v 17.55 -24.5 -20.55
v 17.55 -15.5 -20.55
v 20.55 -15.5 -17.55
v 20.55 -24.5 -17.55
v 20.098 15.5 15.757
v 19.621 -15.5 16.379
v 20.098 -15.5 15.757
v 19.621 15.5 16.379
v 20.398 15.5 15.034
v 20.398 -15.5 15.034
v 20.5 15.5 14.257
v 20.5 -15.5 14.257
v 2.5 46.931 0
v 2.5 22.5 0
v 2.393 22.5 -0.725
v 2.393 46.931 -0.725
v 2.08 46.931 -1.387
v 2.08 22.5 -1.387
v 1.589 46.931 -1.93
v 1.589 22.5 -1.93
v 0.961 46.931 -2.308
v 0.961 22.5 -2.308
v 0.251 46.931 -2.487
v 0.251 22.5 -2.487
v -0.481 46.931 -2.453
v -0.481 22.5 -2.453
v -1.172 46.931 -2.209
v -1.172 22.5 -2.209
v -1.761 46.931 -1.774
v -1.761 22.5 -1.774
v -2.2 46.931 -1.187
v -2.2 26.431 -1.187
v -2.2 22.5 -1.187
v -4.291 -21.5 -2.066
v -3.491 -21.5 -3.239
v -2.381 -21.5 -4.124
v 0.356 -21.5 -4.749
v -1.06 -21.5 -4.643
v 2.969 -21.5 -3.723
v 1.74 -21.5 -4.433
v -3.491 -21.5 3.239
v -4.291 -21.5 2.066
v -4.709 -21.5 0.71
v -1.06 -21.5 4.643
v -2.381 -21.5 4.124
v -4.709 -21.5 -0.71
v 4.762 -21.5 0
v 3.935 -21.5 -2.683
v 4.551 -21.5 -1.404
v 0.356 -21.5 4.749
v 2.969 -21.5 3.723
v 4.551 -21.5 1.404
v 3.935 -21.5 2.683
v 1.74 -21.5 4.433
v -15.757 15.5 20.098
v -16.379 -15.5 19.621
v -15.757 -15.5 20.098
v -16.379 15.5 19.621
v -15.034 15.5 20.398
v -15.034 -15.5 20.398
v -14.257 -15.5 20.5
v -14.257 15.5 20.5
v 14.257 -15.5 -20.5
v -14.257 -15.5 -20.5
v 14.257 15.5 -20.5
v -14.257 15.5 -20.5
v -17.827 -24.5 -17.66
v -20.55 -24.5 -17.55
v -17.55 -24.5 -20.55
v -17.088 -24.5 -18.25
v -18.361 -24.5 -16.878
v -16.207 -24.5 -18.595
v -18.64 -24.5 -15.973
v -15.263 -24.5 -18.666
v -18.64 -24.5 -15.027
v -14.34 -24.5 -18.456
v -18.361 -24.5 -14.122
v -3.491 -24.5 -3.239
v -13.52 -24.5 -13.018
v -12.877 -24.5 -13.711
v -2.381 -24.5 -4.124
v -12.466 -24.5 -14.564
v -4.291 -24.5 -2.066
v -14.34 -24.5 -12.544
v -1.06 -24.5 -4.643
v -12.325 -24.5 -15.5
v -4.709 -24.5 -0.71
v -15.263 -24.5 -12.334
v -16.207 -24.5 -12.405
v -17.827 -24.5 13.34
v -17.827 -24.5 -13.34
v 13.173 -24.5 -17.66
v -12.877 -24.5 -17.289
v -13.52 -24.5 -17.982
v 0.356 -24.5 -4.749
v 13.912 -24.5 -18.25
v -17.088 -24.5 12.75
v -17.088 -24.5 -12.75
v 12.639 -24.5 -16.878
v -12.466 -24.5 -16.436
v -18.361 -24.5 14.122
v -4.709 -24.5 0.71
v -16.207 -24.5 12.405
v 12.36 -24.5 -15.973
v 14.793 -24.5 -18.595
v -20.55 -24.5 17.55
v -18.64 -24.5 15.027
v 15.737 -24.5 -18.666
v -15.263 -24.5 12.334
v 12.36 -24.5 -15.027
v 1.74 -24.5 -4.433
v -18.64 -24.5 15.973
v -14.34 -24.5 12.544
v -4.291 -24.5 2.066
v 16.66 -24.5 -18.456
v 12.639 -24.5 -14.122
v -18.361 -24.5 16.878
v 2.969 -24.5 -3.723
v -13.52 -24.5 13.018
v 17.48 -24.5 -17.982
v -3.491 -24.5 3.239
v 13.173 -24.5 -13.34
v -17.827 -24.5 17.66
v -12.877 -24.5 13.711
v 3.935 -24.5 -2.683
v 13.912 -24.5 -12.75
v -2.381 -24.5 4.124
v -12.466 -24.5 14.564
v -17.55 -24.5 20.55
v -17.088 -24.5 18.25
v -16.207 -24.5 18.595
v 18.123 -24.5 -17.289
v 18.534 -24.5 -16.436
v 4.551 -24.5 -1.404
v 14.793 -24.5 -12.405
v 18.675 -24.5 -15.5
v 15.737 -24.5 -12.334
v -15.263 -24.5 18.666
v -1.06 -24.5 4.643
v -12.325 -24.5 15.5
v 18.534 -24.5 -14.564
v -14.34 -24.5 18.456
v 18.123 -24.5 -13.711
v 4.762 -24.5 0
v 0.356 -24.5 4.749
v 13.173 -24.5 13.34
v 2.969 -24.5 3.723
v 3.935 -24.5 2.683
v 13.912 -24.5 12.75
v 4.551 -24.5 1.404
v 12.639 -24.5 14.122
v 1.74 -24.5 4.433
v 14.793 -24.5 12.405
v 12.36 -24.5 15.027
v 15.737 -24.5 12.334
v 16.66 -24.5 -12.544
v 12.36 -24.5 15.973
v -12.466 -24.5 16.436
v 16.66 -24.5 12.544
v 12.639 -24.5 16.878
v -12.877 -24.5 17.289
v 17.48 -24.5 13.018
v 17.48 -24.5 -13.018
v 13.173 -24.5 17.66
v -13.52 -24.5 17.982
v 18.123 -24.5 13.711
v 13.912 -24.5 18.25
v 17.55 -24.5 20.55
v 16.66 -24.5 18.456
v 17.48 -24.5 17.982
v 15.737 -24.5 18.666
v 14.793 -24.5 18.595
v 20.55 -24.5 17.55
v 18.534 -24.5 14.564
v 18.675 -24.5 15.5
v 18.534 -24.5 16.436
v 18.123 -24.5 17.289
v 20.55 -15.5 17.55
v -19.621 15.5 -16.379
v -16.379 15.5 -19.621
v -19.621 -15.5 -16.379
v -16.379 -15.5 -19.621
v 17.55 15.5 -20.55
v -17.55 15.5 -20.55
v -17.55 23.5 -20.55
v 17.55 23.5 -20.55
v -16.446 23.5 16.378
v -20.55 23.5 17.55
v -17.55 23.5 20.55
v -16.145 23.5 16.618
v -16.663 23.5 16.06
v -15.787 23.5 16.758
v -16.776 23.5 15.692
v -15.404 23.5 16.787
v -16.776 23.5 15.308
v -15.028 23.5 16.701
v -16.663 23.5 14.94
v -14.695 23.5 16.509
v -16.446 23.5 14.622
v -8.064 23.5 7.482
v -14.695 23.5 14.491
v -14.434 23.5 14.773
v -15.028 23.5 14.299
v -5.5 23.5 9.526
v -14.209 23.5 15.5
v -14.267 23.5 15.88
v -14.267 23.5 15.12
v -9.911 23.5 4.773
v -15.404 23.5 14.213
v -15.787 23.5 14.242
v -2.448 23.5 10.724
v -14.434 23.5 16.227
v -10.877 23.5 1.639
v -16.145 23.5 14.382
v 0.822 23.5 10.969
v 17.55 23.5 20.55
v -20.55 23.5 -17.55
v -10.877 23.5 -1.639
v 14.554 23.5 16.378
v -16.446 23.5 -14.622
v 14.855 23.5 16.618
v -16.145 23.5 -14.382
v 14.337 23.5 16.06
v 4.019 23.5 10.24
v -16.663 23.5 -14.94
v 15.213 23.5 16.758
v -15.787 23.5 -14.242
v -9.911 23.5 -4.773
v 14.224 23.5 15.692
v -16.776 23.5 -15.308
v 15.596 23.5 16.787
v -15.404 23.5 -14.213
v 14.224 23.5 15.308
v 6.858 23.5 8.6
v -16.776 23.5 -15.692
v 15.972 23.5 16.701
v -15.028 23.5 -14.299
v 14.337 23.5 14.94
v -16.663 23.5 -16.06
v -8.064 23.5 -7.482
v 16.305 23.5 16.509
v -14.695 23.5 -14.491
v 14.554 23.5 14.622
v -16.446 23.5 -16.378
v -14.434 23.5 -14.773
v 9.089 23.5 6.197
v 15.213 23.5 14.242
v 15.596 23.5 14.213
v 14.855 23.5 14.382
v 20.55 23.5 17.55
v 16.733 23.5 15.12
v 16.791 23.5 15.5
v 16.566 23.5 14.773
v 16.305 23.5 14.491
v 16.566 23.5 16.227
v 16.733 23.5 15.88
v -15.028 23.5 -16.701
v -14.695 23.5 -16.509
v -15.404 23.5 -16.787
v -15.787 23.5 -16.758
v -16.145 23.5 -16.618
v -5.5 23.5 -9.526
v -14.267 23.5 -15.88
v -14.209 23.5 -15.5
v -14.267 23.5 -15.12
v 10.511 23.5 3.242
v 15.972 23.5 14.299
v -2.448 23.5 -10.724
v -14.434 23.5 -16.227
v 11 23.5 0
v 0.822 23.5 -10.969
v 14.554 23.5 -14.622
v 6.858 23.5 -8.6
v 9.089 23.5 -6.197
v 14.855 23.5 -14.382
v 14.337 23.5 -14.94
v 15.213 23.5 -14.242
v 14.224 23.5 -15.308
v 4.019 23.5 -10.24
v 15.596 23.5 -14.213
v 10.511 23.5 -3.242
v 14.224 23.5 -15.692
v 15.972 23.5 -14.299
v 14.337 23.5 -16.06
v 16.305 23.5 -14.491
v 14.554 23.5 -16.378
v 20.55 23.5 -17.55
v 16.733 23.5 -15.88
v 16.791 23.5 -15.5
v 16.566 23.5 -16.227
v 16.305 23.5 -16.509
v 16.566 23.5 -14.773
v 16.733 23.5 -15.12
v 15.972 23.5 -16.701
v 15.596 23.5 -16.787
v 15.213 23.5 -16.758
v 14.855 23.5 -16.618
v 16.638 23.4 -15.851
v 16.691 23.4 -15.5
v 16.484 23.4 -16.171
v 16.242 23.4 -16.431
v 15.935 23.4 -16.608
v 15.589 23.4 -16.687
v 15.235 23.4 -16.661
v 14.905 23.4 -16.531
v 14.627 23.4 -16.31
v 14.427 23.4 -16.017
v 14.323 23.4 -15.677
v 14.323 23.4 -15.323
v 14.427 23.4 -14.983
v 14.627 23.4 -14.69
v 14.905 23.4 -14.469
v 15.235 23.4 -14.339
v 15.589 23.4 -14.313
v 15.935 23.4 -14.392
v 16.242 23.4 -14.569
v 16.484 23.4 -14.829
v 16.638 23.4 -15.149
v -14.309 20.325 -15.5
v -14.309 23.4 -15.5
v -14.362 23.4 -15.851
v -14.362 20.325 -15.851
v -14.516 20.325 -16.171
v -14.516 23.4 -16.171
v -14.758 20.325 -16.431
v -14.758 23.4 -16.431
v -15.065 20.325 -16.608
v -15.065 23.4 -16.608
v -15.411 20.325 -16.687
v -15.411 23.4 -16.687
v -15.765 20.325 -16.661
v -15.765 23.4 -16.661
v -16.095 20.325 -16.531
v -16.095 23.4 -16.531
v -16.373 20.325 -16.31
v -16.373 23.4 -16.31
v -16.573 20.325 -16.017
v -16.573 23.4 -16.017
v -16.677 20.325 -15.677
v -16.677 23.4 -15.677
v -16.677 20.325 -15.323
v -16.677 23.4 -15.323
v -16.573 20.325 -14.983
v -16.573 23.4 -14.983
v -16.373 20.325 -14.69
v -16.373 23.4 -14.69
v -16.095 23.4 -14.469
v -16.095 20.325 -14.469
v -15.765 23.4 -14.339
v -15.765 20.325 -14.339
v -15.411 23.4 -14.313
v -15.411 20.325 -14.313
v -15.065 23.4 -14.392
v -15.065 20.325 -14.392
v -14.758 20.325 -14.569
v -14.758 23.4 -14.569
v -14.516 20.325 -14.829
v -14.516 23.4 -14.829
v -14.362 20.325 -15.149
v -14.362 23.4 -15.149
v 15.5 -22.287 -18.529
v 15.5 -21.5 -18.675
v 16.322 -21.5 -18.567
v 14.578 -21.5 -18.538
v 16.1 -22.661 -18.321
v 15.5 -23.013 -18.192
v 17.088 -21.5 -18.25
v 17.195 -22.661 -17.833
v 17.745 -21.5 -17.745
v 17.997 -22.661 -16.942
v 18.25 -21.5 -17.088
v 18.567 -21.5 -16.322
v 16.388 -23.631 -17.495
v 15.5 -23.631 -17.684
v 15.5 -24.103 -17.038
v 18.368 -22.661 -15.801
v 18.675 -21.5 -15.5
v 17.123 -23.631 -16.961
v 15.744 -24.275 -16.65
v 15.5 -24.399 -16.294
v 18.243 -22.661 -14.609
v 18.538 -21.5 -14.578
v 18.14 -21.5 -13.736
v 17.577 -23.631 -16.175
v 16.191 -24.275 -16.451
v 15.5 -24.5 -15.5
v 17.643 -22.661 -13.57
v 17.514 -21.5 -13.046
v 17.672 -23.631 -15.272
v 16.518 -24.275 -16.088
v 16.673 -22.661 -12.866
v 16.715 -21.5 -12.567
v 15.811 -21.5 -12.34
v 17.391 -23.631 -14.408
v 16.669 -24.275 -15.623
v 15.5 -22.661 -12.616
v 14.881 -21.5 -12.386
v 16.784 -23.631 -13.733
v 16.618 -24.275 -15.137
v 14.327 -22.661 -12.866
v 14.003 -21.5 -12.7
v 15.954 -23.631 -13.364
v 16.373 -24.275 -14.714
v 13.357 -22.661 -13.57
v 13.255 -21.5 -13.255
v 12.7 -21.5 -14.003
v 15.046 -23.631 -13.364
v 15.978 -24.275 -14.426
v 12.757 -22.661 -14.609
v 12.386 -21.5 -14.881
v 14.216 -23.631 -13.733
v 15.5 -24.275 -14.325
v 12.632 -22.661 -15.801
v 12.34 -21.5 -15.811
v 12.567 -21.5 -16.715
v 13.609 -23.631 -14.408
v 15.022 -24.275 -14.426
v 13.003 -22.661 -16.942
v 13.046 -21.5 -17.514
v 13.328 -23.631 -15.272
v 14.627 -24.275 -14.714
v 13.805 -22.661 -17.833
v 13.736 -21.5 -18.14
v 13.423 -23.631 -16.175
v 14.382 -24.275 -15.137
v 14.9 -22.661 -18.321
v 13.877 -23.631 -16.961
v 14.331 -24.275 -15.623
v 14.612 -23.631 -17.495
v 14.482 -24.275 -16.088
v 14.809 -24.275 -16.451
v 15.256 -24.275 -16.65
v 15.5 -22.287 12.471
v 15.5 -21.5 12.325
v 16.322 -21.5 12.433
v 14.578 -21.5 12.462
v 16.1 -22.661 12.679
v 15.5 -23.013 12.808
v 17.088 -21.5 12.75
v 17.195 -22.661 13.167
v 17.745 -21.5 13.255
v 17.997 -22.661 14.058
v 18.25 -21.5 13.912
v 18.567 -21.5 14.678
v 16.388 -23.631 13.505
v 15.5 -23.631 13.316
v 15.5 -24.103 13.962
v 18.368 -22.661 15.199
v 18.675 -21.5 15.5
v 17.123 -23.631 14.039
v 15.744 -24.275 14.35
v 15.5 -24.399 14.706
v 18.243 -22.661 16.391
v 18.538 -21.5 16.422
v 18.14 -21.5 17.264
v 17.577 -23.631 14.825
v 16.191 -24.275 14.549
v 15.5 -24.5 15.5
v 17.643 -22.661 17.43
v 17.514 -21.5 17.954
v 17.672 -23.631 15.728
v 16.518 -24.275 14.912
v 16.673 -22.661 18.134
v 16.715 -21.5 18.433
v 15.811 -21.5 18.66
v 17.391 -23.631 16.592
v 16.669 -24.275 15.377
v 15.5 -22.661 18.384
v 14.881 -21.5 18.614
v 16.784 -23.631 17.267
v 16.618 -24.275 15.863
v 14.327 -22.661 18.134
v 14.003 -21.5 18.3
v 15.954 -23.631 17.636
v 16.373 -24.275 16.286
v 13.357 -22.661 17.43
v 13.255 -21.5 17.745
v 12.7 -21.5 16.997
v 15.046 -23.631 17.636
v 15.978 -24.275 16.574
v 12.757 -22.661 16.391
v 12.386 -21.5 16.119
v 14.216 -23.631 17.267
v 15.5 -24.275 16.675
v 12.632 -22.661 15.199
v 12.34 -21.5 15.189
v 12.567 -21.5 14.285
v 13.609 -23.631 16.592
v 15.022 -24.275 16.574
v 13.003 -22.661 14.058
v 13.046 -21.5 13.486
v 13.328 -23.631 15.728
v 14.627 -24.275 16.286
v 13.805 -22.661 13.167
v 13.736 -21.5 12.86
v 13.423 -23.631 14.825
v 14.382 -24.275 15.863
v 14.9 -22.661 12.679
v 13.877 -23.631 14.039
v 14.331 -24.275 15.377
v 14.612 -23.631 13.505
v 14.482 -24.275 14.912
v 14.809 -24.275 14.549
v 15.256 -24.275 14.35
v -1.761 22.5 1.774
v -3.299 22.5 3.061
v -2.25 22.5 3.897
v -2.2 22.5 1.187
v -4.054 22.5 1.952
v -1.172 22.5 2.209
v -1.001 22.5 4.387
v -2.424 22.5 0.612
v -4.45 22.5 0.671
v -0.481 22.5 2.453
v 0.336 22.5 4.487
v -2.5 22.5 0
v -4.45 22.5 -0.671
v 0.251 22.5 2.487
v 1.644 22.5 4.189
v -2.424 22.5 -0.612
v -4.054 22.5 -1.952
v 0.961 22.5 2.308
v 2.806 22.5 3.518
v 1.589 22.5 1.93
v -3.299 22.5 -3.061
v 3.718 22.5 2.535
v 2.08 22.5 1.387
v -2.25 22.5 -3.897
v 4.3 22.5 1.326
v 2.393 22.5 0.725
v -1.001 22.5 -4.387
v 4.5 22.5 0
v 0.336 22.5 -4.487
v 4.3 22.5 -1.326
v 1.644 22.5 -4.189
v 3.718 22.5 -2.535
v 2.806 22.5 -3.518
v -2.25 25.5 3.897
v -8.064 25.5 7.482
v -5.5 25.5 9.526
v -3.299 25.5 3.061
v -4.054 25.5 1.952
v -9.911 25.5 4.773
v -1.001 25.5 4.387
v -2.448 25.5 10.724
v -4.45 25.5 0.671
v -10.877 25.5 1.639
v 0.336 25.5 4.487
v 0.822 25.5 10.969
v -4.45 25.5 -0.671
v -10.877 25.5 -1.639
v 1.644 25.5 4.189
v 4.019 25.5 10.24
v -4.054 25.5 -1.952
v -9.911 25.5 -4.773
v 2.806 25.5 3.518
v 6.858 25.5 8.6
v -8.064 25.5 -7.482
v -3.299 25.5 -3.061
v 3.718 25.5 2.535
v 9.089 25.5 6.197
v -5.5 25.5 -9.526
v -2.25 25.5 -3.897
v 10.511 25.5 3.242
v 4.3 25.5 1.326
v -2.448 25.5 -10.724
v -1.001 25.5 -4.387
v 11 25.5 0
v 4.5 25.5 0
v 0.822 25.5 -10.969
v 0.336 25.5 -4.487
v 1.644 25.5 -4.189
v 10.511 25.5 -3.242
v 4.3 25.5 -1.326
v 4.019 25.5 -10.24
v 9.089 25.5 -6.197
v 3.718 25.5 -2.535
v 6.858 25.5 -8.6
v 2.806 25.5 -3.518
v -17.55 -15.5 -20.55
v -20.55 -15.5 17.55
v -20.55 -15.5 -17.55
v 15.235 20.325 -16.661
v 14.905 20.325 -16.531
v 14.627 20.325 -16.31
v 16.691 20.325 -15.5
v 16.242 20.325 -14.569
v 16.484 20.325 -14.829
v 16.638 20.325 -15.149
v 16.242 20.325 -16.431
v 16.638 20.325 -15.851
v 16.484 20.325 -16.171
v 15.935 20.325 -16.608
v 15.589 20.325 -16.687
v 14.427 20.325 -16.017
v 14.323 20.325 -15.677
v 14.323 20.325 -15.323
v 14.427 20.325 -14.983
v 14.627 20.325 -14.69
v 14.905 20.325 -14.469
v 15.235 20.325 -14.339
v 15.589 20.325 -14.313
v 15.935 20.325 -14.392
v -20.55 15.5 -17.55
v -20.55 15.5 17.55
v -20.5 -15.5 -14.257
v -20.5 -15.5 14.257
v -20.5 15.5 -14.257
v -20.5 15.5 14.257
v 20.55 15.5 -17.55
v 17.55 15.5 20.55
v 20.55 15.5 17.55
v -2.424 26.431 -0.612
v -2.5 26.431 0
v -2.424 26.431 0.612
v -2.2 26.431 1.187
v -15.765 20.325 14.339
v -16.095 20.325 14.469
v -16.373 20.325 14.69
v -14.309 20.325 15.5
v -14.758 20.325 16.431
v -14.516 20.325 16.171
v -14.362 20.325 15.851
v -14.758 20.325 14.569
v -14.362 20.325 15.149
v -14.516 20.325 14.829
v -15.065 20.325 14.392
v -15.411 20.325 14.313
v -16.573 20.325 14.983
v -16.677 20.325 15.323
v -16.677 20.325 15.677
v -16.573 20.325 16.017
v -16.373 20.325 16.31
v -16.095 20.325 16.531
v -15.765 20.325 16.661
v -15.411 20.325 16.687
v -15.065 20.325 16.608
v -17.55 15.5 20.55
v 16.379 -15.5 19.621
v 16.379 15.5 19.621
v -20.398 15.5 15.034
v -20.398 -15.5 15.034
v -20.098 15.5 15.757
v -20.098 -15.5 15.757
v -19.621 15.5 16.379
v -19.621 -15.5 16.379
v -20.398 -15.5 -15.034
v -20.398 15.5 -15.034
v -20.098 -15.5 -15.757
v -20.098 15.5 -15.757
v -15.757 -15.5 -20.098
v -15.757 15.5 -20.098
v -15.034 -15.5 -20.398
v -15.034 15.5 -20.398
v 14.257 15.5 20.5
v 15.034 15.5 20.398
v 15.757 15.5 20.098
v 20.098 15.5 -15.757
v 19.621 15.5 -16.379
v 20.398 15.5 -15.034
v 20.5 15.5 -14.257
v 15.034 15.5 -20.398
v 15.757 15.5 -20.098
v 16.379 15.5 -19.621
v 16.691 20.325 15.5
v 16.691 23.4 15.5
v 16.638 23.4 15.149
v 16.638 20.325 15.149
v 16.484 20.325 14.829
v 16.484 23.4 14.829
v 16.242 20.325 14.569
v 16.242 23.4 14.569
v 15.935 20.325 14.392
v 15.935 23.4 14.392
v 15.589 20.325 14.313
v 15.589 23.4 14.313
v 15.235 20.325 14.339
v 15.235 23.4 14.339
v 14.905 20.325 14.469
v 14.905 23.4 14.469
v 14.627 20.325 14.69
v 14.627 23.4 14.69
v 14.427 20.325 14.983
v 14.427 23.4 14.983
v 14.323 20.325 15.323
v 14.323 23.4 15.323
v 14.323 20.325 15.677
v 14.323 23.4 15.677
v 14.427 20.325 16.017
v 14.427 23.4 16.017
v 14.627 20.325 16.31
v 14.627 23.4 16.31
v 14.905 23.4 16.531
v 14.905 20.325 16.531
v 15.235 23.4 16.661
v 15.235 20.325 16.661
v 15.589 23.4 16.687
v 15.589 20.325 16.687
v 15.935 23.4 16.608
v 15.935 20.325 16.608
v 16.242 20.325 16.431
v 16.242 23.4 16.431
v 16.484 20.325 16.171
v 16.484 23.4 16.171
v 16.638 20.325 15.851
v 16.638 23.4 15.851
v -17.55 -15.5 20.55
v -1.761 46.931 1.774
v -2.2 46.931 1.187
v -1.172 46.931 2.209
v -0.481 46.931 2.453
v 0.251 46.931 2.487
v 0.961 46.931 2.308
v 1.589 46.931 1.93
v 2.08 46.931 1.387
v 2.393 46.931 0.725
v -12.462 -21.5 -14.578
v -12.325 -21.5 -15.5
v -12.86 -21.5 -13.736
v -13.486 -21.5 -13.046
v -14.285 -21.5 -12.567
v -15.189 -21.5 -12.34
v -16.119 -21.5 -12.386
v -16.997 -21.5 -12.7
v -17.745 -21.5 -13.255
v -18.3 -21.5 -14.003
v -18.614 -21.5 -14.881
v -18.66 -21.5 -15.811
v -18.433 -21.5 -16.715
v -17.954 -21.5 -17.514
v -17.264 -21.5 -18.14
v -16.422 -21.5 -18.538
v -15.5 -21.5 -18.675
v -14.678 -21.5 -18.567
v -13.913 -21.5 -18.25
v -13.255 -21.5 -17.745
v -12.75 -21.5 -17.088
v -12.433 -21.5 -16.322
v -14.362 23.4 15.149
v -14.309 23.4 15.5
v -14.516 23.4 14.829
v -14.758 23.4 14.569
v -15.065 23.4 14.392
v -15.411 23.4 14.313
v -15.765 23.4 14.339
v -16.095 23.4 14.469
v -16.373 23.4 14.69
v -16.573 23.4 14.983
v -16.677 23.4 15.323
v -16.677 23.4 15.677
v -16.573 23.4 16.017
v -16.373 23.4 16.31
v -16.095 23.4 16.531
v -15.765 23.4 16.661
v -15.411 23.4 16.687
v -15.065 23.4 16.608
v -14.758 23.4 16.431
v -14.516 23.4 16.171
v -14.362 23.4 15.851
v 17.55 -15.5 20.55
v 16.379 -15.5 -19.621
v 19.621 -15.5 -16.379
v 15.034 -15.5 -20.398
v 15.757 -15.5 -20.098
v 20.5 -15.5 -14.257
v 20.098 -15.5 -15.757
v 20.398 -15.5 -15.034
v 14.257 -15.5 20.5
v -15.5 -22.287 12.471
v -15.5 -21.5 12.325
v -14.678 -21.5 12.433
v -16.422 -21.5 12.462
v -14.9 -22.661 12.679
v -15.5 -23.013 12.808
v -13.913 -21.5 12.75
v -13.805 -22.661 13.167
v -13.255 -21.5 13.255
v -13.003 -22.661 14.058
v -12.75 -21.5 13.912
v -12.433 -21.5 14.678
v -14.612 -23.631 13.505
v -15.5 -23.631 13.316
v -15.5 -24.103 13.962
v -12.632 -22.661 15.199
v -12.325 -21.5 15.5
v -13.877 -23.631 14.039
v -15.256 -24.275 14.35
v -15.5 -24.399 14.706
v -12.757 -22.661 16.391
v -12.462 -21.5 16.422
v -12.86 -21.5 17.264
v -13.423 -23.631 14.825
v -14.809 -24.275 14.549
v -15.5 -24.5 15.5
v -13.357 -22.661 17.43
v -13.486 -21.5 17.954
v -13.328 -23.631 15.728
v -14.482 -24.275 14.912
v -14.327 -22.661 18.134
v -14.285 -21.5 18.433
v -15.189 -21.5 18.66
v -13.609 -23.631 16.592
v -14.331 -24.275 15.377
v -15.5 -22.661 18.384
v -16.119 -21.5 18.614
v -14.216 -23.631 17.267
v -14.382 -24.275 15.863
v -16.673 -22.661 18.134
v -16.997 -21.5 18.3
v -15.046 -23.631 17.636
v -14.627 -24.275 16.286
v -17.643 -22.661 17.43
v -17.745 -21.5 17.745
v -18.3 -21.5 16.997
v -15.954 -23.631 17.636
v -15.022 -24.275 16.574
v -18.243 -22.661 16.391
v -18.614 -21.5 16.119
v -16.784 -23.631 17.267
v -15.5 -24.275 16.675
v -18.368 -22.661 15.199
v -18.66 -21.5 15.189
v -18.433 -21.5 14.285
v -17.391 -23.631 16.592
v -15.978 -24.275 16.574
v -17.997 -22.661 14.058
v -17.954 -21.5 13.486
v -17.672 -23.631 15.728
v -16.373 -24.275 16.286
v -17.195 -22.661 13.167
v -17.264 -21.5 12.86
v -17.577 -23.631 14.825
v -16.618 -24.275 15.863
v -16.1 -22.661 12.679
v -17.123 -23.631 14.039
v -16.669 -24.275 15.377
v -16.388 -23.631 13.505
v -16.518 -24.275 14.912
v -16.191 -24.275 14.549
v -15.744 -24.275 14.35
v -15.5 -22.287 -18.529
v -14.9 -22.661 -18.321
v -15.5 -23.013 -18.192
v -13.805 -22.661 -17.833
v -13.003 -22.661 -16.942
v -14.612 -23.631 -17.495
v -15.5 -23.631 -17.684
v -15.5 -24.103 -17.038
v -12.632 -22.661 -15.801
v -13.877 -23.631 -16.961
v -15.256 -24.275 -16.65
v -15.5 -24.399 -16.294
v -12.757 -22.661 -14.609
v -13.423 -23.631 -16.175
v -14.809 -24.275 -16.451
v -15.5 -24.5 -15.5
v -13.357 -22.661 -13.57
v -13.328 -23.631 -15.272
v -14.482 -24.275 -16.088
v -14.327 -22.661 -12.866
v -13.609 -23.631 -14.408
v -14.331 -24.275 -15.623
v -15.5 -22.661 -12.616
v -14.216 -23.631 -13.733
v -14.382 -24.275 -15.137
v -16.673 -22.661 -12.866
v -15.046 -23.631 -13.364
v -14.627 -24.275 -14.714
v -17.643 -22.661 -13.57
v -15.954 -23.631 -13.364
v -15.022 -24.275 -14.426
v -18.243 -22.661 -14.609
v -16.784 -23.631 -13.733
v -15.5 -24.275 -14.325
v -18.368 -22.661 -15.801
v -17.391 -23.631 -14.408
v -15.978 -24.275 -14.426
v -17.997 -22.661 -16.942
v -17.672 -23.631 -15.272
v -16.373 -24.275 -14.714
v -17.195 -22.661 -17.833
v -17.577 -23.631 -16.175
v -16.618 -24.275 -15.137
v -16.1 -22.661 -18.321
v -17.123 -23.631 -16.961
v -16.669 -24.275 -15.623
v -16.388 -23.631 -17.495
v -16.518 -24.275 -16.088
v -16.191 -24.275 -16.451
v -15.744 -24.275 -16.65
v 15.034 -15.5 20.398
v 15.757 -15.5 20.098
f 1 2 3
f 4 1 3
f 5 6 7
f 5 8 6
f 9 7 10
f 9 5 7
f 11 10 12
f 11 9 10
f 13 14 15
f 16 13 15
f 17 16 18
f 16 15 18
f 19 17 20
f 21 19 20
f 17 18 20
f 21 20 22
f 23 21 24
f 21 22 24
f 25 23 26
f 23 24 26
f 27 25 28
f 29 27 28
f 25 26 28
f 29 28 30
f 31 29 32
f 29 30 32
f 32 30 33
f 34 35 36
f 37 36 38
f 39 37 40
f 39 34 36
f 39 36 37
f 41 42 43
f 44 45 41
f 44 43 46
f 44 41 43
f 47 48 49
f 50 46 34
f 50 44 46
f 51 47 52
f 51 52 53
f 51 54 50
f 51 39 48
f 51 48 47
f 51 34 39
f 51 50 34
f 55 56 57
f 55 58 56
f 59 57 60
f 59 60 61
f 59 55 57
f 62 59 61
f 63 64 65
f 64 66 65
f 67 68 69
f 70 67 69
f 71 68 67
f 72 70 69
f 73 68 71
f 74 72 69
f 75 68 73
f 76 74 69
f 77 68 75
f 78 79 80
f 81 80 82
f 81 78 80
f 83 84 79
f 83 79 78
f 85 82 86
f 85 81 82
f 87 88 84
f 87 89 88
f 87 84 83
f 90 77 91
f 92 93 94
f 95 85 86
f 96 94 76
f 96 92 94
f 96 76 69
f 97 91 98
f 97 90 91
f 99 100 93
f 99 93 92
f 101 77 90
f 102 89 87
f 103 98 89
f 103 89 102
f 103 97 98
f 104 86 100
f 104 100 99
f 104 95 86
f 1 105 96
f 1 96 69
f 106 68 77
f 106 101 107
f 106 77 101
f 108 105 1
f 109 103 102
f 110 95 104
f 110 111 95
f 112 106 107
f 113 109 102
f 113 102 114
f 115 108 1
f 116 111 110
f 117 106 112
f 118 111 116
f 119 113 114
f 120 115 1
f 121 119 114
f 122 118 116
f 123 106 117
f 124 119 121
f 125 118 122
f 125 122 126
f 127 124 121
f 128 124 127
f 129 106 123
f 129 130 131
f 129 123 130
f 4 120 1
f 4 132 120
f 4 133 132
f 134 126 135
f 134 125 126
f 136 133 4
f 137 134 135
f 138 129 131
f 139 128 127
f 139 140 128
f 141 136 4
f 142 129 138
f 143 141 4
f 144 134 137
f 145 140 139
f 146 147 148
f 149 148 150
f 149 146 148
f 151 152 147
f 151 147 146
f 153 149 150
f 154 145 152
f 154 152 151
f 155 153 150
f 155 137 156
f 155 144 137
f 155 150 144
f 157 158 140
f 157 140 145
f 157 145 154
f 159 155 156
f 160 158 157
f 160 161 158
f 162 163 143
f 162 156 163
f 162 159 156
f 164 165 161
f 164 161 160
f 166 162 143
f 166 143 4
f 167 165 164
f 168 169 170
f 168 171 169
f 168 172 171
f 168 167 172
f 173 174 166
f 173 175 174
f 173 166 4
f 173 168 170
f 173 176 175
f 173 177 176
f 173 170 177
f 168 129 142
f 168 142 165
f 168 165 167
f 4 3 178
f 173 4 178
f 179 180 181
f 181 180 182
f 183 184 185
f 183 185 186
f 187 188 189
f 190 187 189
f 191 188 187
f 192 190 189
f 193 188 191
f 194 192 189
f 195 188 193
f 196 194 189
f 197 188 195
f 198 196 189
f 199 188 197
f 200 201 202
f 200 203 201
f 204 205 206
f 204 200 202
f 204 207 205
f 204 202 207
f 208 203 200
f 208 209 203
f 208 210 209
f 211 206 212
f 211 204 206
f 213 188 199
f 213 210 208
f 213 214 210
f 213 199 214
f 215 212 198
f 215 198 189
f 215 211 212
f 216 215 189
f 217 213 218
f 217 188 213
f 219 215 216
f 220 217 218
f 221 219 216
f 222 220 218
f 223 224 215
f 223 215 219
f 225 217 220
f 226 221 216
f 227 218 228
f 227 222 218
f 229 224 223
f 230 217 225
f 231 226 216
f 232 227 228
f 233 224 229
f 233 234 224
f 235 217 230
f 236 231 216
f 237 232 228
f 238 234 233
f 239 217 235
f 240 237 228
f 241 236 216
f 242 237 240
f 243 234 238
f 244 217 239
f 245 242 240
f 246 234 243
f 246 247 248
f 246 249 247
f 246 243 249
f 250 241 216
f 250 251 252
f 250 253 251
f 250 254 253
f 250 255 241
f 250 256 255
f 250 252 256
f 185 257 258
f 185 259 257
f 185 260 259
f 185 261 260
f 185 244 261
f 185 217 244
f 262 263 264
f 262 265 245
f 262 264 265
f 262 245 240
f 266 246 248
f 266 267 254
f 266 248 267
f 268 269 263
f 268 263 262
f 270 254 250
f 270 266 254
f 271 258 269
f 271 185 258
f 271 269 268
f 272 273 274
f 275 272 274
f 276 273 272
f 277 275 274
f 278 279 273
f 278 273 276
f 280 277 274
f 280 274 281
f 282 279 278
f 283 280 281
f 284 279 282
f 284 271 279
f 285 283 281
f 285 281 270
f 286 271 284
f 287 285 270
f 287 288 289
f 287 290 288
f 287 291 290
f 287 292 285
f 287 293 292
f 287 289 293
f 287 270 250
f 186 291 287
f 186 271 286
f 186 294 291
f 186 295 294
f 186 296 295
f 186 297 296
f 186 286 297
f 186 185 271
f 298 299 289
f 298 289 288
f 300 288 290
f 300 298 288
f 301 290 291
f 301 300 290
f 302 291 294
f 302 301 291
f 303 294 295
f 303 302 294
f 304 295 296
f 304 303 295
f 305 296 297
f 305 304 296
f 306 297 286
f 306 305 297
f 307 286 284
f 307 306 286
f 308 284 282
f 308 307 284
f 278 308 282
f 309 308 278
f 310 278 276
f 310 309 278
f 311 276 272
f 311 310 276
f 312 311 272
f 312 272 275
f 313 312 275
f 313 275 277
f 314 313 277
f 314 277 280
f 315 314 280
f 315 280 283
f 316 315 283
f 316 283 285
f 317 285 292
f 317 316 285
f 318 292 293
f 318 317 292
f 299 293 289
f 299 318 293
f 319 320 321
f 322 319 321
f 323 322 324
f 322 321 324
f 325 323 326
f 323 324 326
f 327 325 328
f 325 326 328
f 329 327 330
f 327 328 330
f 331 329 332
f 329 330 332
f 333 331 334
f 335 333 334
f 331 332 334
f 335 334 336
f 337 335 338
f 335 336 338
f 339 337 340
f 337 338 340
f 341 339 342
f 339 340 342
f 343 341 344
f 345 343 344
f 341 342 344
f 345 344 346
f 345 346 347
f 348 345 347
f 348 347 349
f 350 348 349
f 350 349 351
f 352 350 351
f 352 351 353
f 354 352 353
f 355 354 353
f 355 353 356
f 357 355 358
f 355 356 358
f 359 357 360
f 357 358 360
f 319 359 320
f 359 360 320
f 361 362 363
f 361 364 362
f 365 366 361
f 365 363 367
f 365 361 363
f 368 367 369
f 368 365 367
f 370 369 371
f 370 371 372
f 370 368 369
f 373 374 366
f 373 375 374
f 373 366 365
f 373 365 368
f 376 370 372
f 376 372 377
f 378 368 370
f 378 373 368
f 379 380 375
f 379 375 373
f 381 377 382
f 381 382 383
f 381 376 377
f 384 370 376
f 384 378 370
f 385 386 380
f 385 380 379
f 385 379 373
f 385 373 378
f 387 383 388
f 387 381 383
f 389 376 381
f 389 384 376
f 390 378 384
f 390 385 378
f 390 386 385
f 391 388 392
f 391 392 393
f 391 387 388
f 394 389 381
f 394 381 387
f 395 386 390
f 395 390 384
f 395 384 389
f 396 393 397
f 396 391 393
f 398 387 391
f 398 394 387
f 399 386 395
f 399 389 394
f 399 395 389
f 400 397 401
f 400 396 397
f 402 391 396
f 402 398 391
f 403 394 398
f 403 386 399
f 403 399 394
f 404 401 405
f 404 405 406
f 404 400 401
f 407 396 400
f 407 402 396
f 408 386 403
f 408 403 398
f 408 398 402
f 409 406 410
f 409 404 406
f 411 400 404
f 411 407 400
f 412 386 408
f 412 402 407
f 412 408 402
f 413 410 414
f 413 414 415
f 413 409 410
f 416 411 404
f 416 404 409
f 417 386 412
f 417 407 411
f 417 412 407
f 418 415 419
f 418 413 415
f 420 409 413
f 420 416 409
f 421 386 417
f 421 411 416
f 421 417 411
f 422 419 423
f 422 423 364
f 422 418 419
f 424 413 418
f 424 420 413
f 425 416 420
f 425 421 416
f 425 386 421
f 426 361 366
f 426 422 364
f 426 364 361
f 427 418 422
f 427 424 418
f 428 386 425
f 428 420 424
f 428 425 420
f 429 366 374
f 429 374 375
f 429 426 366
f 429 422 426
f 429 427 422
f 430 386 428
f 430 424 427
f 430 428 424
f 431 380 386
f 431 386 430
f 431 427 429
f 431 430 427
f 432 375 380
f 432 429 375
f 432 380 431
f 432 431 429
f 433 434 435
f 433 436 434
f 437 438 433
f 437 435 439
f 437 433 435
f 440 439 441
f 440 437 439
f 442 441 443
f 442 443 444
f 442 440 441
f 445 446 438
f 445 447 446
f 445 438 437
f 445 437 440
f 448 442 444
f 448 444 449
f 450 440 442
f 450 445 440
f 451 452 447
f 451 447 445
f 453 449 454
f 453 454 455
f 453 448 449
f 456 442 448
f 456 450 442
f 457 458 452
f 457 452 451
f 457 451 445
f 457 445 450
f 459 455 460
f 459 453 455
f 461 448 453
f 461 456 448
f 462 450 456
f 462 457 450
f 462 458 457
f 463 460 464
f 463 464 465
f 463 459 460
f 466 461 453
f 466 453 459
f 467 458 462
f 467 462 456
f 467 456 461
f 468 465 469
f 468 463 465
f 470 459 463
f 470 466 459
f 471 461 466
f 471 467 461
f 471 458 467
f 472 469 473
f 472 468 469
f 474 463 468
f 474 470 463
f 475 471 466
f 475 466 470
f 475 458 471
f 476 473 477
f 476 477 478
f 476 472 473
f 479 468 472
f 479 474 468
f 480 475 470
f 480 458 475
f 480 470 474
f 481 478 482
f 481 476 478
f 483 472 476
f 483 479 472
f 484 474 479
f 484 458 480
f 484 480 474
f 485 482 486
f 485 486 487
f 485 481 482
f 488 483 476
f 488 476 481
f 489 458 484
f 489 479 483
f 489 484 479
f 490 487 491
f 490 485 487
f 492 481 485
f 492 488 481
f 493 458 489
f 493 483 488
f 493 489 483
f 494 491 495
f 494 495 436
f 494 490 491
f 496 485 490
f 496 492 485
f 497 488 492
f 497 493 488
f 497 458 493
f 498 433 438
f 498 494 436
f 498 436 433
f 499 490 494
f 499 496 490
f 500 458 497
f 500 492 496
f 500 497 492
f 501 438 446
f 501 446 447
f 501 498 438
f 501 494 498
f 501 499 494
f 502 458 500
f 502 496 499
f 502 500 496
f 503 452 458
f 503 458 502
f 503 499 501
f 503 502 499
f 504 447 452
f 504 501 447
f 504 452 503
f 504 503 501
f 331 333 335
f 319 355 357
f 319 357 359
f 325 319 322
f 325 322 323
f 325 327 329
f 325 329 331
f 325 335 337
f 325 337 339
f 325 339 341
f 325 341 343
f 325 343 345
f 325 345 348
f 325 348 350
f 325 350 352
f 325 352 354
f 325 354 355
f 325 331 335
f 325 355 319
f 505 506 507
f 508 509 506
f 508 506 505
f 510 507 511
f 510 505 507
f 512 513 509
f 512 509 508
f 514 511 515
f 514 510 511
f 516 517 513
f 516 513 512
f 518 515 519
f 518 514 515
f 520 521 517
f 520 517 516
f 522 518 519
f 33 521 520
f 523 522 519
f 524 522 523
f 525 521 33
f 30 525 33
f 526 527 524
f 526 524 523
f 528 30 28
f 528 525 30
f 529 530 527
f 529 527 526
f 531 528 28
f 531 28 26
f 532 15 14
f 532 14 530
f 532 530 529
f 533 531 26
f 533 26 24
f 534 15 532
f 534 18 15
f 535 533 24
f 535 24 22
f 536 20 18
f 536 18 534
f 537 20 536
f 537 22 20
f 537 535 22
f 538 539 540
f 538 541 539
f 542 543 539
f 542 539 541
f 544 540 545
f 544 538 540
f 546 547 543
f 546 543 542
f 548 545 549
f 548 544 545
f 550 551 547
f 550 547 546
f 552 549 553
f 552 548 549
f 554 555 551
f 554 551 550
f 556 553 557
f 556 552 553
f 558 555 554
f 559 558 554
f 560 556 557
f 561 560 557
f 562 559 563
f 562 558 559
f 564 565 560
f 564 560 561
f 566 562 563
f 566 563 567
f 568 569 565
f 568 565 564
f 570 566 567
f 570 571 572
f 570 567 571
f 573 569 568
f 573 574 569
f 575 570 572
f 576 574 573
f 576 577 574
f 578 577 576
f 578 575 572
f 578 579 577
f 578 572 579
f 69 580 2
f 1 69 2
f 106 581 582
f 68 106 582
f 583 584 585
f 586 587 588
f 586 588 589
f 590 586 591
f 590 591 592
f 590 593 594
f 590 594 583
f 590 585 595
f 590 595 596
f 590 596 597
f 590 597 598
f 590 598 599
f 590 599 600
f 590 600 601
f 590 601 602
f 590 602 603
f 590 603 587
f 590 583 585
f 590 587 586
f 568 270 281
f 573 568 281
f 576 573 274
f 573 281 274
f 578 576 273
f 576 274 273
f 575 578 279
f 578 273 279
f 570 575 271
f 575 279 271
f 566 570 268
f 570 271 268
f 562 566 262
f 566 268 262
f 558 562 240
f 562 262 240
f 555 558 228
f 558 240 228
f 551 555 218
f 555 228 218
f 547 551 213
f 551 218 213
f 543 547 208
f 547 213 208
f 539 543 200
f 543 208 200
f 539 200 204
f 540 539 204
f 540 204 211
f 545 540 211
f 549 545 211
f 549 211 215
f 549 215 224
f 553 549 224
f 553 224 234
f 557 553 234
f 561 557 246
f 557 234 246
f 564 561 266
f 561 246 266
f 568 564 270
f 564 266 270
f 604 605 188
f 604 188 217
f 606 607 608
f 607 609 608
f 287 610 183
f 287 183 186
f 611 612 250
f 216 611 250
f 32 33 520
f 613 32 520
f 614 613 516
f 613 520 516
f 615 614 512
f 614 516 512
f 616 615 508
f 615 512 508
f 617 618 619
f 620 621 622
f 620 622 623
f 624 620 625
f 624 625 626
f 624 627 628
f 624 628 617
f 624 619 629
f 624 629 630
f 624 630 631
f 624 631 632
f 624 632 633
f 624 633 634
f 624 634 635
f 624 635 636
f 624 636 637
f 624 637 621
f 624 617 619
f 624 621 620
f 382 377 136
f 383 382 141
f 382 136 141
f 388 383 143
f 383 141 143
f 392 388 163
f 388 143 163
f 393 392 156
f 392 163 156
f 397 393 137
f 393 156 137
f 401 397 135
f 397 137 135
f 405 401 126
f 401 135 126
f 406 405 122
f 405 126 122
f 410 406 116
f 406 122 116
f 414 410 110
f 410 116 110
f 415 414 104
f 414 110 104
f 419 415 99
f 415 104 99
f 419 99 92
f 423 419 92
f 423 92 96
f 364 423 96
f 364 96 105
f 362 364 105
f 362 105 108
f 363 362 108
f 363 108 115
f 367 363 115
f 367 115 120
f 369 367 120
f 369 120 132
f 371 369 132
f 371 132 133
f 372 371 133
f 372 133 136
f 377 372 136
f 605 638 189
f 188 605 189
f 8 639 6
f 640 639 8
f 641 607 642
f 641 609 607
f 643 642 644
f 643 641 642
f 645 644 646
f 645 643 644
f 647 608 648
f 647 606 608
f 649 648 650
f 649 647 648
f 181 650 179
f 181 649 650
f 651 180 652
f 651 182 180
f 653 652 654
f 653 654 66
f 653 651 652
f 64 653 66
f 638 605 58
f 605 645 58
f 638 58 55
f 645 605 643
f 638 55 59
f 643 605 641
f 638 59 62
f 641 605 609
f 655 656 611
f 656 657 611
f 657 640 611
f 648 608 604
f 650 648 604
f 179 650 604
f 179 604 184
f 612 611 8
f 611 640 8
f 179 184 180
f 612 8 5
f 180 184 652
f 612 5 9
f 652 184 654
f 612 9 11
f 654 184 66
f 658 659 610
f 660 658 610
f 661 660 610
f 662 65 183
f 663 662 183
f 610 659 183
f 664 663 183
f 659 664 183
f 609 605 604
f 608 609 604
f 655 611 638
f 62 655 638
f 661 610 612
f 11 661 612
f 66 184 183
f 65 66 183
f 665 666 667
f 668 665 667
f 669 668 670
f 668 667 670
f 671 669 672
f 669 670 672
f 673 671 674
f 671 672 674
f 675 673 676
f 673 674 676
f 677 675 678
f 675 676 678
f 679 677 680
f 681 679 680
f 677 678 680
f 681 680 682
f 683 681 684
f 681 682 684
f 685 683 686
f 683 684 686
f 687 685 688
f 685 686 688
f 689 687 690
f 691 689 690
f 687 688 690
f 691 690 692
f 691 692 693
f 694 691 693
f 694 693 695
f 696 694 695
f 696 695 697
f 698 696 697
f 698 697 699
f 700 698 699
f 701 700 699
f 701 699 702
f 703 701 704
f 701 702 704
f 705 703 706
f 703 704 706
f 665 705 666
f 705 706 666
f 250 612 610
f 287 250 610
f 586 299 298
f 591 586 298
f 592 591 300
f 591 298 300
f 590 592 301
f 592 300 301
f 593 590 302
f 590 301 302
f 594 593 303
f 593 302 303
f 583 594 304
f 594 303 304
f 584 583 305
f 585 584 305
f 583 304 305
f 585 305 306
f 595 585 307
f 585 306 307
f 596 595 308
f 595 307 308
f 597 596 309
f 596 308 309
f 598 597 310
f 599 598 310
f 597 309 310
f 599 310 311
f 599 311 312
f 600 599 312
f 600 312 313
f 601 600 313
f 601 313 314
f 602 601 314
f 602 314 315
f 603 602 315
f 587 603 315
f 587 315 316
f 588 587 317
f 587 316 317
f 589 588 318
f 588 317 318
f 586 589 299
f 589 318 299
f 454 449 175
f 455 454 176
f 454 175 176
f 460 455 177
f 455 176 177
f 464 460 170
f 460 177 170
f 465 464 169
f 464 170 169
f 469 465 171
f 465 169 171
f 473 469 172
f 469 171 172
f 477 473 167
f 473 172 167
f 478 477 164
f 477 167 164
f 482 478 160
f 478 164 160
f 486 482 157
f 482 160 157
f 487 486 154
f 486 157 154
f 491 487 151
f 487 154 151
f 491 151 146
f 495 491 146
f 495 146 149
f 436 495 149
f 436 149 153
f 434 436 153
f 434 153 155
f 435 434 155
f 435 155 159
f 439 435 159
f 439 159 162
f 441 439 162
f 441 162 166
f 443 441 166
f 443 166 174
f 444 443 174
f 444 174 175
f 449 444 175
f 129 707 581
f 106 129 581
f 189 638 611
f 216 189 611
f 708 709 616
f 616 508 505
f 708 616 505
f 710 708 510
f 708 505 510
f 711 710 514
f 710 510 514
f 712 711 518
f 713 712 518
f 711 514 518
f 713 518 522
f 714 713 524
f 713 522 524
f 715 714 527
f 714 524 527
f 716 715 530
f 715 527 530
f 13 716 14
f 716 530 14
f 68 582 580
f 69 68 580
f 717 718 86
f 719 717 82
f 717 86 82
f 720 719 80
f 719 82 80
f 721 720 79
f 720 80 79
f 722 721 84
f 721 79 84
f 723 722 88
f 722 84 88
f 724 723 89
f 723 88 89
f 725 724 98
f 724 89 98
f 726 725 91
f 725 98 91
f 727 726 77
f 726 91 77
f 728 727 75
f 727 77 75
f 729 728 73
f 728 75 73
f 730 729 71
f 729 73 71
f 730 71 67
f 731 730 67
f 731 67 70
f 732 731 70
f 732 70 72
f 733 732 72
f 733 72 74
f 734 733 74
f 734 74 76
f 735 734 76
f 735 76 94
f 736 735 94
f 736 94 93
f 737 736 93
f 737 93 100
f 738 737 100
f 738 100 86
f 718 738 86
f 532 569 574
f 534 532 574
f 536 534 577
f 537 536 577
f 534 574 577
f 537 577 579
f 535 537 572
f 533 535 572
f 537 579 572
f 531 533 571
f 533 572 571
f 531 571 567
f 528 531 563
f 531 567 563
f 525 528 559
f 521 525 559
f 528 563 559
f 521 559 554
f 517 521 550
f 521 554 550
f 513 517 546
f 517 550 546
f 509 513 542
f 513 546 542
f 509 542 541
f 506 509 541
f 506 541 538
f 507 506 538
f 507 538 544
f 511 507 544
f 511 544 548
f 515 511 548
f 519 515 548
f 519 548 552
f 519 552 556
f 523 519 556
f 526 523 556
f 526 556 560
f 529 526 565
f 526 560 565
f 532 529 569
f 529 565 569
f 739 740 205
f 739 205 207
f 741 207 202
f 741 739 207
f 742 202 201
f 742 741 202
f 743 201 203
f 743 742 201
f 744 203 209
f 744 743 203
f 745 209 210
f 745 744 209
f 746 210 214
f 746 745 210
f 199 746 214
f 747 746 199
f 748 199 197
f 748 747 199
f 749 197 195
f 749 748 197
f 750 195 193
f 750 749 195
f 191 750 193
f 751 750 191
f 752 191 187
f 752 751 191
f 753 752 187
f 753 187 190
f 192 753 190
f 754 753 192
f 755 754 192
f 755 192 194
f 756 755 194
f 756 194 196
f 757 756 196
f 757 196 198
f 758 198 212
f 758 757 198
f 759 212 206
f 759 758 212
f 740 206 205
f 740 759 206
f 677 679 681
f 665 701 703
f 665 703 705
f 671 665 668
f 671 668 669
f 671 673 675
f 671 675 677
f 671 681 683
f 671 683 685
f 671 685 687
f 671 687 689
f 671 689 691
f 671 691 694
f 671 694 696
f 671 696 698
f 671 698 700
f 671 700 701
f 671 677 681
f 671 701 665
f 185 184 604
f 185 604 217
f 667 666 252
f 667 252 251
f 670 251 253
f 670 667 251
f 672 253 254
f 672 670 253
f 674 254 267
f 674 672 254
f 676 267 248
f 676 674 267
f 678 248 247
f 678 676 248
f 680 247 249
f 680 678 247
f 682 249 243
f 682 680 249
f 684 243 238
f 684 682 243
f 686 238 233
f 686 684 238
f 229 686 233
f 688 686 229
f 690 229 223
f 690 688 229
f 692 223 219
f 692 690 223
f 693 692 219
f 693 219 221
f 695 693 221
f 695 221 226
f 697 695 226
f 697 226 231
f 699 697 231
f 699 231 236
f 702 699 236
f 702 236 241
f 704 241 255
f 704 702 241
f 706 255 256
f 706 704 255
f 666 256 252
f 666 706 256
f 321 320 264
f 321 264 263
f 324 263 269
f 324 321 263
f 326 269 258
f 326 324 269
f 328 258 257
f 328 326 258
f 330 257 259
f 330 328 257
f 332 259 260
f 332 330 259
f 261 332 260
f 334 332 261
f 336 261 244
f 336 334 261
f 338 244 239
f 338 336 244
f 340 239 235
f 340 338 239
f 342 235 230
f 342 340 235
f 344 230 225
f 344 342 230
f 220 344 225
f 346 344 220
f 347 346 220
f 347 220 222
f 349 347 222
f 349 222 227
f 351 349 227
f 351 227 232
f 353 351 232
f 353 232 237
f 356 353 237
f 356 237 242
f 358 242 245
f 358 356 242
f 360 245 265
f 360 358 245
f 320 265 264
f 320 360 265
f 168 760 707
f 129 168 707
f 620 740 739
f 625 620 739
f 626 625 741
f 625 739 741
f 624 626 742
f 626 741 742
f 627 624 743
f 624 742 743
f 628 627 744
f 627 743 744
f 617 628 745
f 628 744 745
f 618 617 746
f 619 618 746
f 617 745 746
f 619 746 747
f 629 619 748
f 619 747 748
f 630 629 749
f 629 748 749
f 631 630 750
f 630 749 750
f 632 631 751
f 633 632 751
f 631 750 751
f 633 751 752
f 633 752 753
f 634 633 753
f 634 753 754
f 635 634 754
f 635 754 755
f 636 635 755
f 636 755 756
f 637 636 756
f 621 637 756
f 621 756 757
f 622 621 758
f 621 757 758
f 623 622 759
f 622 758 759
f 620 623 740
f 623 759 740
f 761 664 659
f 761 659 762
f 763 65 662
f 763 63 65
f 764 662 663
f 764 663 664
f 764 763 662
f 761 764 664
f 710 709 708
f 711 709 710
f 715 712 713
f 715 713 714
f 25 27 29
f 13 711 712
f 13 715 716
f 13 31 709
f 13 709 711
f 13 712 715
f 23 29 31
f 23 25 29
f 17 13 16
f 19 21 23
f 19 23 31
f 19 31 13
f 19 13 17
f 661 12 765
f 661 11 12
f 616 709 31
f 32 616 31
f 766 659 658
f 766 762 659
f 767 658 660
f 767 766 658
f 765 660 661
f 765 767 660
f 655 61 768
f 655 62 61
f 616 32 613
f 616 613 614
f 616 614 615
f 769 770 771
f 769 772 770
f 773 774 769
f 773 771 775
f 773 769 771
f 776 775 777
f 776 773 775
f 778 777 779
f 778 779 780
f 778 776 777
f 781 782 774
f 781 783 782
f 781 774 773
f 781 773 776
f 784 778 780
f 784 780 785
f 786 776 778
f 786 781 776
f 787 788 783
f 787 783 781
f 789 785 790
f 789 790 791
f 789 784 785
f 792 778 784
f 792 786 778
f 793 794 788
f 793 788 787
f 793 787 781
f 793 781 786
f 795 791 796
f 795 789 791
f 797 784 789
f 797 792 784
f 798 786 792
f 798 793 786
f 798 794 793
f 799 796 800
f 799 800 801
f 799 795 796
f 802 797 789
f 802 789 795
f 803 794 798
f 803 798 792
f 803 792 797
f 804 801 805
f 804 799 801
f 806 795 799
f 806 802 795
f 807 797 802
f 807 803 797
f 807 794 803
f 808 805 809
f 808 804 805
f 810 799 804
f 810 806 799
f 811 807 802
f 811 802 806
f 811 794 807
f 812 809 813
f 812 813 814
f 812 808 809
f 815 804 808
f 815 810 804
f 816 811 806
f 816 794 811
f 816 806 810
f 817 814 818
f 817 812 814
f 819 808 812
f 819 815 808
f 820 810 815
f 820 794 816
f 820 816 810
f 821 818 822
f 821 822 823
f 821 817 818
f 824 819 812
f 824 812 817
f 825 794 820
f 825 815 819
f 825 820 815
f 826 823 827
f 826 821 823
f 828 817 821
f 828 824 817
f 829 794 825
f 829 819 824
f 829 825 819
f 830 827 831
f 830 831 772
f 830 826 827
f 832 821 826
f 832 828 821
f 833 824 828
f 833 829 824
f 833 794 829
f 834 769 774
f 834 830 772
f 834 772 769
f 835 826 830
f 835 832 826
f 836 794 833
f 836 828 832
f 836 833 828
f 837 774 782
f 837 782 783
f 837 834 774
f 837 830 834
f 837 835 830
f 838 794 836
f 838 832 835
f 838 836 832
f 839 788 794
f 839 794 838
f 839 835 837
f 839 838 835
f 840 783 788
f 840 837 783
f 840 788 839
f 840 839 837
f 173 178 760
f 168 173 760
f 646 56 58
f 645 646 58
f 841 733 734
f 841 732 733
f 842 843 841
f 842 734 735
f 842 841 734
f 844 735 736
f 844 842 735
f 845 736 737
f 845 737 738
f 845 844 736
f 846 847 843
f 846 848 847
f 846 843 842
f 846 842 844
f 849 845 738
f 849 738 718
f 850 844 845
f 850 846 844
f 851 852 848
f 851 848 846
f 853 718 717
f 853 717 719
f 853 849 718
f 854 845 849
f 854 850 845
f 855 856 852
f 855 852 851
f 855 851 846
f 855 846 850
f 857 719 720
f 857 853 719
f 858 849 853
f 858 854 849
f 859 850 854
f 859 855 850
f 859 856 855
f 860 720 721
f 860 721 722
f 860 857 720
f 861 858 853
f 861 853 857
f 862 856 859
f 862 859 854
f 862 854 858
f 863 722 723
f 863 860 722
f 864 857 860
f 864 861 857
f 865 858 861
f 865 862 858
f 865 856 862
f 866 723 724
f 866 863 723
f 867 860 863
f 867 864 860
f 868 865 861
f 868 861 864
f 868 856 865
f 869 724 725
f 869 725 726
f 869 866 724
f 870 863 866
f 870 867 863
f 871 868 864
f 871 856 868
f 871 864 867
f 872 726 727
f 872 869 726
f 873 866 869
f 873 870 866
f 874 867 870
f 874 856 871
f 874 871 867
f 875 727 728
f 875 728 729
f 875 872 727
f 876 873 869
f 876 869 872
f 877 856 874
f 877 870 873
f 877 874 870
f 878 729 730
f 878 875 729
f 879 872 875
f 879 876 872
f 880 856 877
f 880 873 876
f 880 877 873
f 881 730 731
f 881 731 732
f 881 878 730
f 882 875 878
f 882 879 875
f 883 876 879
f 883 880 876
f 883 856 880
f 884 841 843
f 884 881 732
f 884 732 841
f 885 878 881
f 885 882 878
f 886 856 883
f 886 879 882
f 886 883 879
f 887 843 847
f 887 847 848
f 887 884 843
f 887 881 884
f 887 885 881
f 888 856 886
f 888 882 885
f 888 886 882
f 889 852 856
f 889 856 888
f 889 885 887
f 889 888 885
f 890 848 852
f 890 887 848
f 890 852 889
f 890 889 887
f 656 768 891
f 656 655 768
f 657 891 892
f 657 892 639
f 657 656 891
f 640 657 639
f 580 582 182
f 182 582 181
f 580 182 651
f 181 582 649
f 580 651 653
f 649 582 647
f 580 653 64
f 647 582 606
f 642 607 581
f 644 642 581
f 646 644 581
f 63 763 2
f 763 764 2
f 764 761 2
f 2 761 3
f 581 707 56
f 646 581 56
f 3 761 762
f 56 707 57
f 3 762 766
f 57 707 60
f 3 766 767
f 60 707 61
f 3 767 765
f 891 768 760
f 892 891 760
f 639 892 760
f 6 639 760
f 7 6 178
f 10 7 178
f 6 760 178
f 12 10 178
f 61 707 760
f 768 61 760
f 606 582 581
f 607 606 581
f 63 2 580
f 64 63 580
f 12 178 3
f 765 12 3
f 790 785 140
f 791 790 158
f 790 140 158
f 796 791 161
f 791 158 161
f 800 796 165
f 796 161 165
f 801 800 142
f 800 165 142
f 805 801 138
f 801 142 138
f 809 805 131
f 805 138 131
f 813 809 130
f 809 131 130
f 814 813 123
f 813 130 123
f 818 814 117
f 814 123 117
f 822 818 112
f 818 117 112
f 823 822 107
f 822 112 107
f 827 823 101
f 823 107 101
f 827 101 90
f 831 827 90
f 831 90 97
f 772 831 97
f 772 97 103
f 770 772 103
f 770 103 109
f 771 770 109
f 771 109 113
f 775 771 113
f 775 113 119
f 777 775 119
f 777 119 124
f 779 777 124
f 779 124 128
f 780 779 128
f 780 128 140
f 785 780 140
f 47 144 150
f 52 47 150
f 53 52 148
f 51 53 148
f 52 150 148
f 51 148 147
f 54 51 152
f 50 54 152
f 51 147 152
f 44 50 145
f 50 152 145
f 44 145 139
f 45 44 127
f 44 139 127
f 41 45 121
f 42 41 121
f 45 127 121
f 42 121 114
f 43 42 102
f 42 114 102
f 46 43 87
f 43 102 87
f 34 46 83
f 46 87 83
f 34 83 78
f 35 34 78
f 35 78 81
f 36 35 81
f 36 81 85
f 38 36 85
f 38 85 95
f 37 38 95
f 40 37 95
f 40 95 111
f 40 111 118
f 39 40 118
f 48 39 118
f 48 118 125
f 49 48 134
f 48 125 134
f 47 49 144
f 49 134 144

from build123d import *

# Parameters (mm, degrees)
CROQUIS1_W              = 41
CROQUIS1_H              = 41
SALIENTE_EXTRUIR1_DEPTH = 15.5
CHAFL_N1_SIZE           = 5
REDONDEO1_R             = 3
CROQUIS2_W              = 41.1
CROQUIS2_H              = 41.1
SALIENTE_EXTRUIR2_DEPTH = 8
CHAFL_N2_SIZE           = 3
SALIENTE_EXTRUIR3_DEPTH = 9
CROQUIS4_R              = 11
SALIENTE_EXTRUIR4_DEPTH = 2
CROQUIS5_R              = 1.190625
CORTAR_EXTRUIR1_DEPTH   = 3.175
CHAFL_N3_SIZE           = 0.1
CROQUIS6_R              = 4.7625
CROQUIS6_R_2            = 3.175
CORTAR_EXTRUIR2_DEPTH   = 3
C_PULA1_FACE_RADIUS     = 3.175
C_PULA1_HEIGHT          = 3
C_PULA2_FACE_RADIUS     = 3.175
C_PULA2_HEIGHT          = 3
C_PULA3_FACE_RADIUS     = 3.175
C_PULA3_HEIGHT          = 3
C_PULA4_FACE_RADIUS     = 3.175
C_PULA4_HEIGHT          = 3
CROQUIS7_R              = 4.5
CORTAR_EXTRUIR3_DEPTH   = 3
SALIENTE_EXTRUIR5_DEPTH = 24.43125
CORTAR_EXTRUIR4_DEPTH   = 20.5


with BuildPart() as part:
    # Croquis1 → Saliente-Extruir1 (new body, symmetric)
    with BuildSketch(Plane(origin=(0, 0, 0), x_dir=(1, 0, 0), z_dir=(0, 1, 0))):
        Rectangle(CROQUIS1_W, CROQUIS1_H)
    extrude(amount=SALIENTE_EXTRUIR1_DEPTH, both=True)

    # Chaflán1
    chafl_n1_edges = [part.edges().sort_by_distance(p)[0] for p in [
        (20.5, 0, 20.5),
        (-20.5, 0, 20.5),
        (-20.5, 0, -20.5),
        (20.5, 0, -20.5),
    ]]
    chamfer(chafl_n1_edges, length=CHAFL_N1_SIZE)

    # Redondeo1
    redondeo1_edges = [part.edges().sort_by_distance(p)[0] for p in [
        (15.5, 0, 20.5),
        (-15.5, 0, 20.5),
        (-20.5, 0, -15.5),
        (-20.5, 0, 15.5),
        (15.5, 0, -20.5),
        (-15.5, 0, -20.5),
        (20.5, 0, 15.5),
        (20.5, 0, -15.5),
    ]]
    fillet(redondeo1_edges, radius=REDONDEO1_R)

    # Croquis2 → Saliente-Extruir2 (add)
    with BuildSketch(Plane(origin=(0, 15.5, 0), x_dir=(1, 0, 0), z_dir=(0, 1, 0))):
        Rectangle(CROQUIS2_W, CROQUIS2_H)
    extrude(amount=SALIENTE_EXTRUIR2_DEPTH)

    # Chaflán2
    chafl_n2_edges = [part.edges().sort_by_distance(p)[0] for p in [
        (20.55, 19.5, 20.55),
        (20.55, 19.5, -20.55),
        (-20.55, 19.5, -20.55),
        (-20.55, 19.5, 20.55),
    ]]
    chamfer(chafl_n2_edges, length=CHAFL_N2_SIZE)

    # Croquis3 → Saliente-Extruir3 (add)
    with BuildSketch(Plane.XZ.offset(15.5)):
        Polygon((17.55, 20.55), (-17.55, 20.55), (-20.55, 17.55), (-20.55, -17.55), (-17.55, -20.55), (17.55, -20.55), (20.55, -17.55), (20.55, 17.55), align=None)
    extrude(amount=SALIENTE_EXTRUIR3_DEPTH)

    # Croquis4 → Saliente-Extruir4 (add)
    with BuildSketch(Plane(origin=(0, 23.5, 0), x_dir=(1, 0, 0), z_dir=(0, 1, 0))):
        Circle(CROQUIS4_R)
    extrude(amount=SALIENTE_EXTRUIR4_DEPTH)

    # Croquis5 → Cortar-Extruir1 (cut)
    with BuildSketch(Plane(origin=(0, 23.5, 0), x_dir=(1, 0, 0), z_dir=(0, 1, 0))):
        with Locations((-15.5, 15.5)):
            Circle(CROQUIS5_R)
        with Locations((15.5, 15.5)):
            Circle(CROQUIS5_R)
        with Locations((15.5, -15.5)):
            Circle(CROQUIS5_R)
        with Locations((-15.5, -15.5)):
            Circle(CROQUIS5_R)
    extrude(amount=-CORTAR_EXTRUIR1_DEPTH, mode=Mode.SUBTRACT)

    # Chaflán3
    chafl_n3_edges = [part.edges().sort_by_distance(p)[0] for p in [
        (-16.690625, 23.5, -15.5),
        (14.309375, 23.5, -15.5),
        (14.309375, 23.5, 15.5),
        (-16.690625, 23.5, 15.5),
    ]]
    chamfer(chafl_n3_edges, length=CHAFL_N3_SIZE)

    # Croquis6 → Cortar-Extruir2 (cut)
    with BuildSketch(Plane.XZ.offset(24.5)):
        Circle(CROQUIS6_R)
        with Locations((-15.5, 15.5)):
            Circle(CROQUIS6_R_2)
        with Locations((15.5, 15.5)):
            Circle(CROQUIS6_R_2)
        with Locations((15.5, -15.5)):
            Circle(CROQUIS6_R_2)
        with Locations((-15.5, -15.5)):
            Circle(CROQUIS6_R_2)
    extrude(amount=-CORTAR_EXTRUIR2_DEPTH, mode=Mode.SUBTRACT)

    # Cúpula1: a dome of height H over a round flat face of radius A is a cap of a sphere of radius (A * A + H * H) / (2 * H)
    c_pula1_r = (C_PULA1_FACE_RADIUS * C_PULA1_FACE_RADIUS + C_PULA1_HEIGHT * C_PULA1_HEIGHT) / (2 * C_PULA1_HEIGHT)
    c_pula1_base = Plane((15.5, -21.5, 15.5), z_dir=(0, -1, 0))
    with Locations(c_pula1_base.offset(C_PULA1_HEIGHT - c_pula1_r)):
        c_pula1_ball = Sphere(c_pula1_r, mode=Mode.PRIVATE)
    add(split(c_pula1_ball, bisect_by=c_pula1_base, keep=Keep.TOP, mode=Mode.PRIVATE))

    # Cúpula2: a dome of height H over a round flat face of radius A is a cap of a sphere of radius (A * A + H * H) / (2 * H)
    c_pula2_r = (C_PULA2_FACE_RADIUS * C_PULA2_FACE_RADIUS + C_PULA2_HEIGHT * C_PULA2_HEIGHT) / (2 * C_PULA2_HEIGHT)
    c_pula2_base = Plane((-15.5, -21.5, 15.5), z_dir=(0, -1, 0))
    with Locations(c_pula2_base.offset(C_PULA2_HEIGHT - c_pula2_r)):
        c_pula2_ball = Sphere(c_pula2_r, mode=Mode.PRIVATE)
    add(split(c_pula2_ball, bisect_by=c_pula2_base, keep=Keep.TOP, mode=Mode.PRIVATE))

    # Cúpula3: a dome of height H over a round flat face of radius A is a cap of a sphere of radius (A * A + H * H) / (2 * H)
    c_pula3_r = (C_PULA3_FACE_RADIUS * C_PULA3_FACE_RADIUS + C_PULA3_HEIGHT * C_PULA3_HEIGHT) / (2 * C_PULA3_HEIGHT)
    c_pula3_base = Plane((15.5, -21.5, -15.5), z_dir=(0, -1, 0))
    with Locations(c_pula3_base.offset(C_PULA3_HEIGHT - c_pula3_r)):
        c_pula3_ball = Sphere(c_pula3_r, mode=Mode.PRIVATE)
    add(split(c_pula3_ball, bisect_by=c_pula3_base, keep=Keep.TOP, mode=Mode.PRIVATE))

    # Cúpula4: a dome of height H over a round flat face of radius A is a cap of a sphere of radius (A * A + H * H) / (2 * H)
    c_pula4_r = (C_PULA4_FACE_RADIUS * C_PULA4_FACE_RADIUS + C_PULA4_HEIGHT * C_PULA4_HEIGHT) / (2 * C_PULA4_HEIGHT)
    c_pula4_base = Plane((-15.5, -21.5, -15.5), z_dir=(0, -1, 0))
    with Locations(c_pula4_base.offset(C_PULA4_HEIGHT - c_pula4_r)):
        c_pula4_ball = Sphere(c_pula4_r, mode=Mode.PRIVATE)
    add(split(c_pula4_ball, bisect_by=c_pula4_base, keep=Keep.TOP, mode=Mode.PRIVATE))

    # Croquis7 → Cortar-Extruir3 (cut)
    with BuildSketch(Plane(origin=(0, 25.5, 0), x_dir=(1, 0, 0), z_dir=(0, 1, 0))):
        Circle(CROQUIS7_R)
    extrude(amount=-CORTAR_EXTRUIR3_DEPTH, mode=Mode.SUBTRACT)

    # Croquis8 → Saliente-Extruir5 (add)
    with BuildSketch(Plane(origin=(0, 22.5, 0), x_dir=(1, 0, 0), z_dir=(0, 1, 0))):
        with BuildLine():
            ThreePointArc((2.5, 0), (0.612372436, 2.423839929), (-2.2, 1.187434209))
            Line((-2.2, 1.187434209), (-2.2, -1.187434209))
            ThreePointArc((-2.2, -1.187434209), (0.612372436, -2.423839929), (2.5, 0))
        make_face()
        with BuildLine():
            Line((-2.2, -1.187434209), (-2.2, 1.187434209))
            ThreePointArc((-2.2, 1.187434209), (-2.5, 0), (-2.2, -1.187434209))
        make_face()
    extrude(amount=SALIENTE_EXTRUIR5_DEPTH)

    # Croquis9 → Cortar-Extruir4 (cut)
    with BuildSketch(Plane(origin=(0, 46.93125, 0), x_dir=(1, 0, 0), z_dir=(0, 1, 0))):
        with BuildLine():
            Line((-2.2, -1.187434209), (-2.2, 1.187434209))
            ThreePointArc((-2.2, 1.187434209), (-2.5, 0), (-2.2, -1.187434209))
        make_face()
    extrude(amount=-CORTAR_EXTRUIR4_DEPTH, mode=Mode.SUBTRACT)


solid = part.part
